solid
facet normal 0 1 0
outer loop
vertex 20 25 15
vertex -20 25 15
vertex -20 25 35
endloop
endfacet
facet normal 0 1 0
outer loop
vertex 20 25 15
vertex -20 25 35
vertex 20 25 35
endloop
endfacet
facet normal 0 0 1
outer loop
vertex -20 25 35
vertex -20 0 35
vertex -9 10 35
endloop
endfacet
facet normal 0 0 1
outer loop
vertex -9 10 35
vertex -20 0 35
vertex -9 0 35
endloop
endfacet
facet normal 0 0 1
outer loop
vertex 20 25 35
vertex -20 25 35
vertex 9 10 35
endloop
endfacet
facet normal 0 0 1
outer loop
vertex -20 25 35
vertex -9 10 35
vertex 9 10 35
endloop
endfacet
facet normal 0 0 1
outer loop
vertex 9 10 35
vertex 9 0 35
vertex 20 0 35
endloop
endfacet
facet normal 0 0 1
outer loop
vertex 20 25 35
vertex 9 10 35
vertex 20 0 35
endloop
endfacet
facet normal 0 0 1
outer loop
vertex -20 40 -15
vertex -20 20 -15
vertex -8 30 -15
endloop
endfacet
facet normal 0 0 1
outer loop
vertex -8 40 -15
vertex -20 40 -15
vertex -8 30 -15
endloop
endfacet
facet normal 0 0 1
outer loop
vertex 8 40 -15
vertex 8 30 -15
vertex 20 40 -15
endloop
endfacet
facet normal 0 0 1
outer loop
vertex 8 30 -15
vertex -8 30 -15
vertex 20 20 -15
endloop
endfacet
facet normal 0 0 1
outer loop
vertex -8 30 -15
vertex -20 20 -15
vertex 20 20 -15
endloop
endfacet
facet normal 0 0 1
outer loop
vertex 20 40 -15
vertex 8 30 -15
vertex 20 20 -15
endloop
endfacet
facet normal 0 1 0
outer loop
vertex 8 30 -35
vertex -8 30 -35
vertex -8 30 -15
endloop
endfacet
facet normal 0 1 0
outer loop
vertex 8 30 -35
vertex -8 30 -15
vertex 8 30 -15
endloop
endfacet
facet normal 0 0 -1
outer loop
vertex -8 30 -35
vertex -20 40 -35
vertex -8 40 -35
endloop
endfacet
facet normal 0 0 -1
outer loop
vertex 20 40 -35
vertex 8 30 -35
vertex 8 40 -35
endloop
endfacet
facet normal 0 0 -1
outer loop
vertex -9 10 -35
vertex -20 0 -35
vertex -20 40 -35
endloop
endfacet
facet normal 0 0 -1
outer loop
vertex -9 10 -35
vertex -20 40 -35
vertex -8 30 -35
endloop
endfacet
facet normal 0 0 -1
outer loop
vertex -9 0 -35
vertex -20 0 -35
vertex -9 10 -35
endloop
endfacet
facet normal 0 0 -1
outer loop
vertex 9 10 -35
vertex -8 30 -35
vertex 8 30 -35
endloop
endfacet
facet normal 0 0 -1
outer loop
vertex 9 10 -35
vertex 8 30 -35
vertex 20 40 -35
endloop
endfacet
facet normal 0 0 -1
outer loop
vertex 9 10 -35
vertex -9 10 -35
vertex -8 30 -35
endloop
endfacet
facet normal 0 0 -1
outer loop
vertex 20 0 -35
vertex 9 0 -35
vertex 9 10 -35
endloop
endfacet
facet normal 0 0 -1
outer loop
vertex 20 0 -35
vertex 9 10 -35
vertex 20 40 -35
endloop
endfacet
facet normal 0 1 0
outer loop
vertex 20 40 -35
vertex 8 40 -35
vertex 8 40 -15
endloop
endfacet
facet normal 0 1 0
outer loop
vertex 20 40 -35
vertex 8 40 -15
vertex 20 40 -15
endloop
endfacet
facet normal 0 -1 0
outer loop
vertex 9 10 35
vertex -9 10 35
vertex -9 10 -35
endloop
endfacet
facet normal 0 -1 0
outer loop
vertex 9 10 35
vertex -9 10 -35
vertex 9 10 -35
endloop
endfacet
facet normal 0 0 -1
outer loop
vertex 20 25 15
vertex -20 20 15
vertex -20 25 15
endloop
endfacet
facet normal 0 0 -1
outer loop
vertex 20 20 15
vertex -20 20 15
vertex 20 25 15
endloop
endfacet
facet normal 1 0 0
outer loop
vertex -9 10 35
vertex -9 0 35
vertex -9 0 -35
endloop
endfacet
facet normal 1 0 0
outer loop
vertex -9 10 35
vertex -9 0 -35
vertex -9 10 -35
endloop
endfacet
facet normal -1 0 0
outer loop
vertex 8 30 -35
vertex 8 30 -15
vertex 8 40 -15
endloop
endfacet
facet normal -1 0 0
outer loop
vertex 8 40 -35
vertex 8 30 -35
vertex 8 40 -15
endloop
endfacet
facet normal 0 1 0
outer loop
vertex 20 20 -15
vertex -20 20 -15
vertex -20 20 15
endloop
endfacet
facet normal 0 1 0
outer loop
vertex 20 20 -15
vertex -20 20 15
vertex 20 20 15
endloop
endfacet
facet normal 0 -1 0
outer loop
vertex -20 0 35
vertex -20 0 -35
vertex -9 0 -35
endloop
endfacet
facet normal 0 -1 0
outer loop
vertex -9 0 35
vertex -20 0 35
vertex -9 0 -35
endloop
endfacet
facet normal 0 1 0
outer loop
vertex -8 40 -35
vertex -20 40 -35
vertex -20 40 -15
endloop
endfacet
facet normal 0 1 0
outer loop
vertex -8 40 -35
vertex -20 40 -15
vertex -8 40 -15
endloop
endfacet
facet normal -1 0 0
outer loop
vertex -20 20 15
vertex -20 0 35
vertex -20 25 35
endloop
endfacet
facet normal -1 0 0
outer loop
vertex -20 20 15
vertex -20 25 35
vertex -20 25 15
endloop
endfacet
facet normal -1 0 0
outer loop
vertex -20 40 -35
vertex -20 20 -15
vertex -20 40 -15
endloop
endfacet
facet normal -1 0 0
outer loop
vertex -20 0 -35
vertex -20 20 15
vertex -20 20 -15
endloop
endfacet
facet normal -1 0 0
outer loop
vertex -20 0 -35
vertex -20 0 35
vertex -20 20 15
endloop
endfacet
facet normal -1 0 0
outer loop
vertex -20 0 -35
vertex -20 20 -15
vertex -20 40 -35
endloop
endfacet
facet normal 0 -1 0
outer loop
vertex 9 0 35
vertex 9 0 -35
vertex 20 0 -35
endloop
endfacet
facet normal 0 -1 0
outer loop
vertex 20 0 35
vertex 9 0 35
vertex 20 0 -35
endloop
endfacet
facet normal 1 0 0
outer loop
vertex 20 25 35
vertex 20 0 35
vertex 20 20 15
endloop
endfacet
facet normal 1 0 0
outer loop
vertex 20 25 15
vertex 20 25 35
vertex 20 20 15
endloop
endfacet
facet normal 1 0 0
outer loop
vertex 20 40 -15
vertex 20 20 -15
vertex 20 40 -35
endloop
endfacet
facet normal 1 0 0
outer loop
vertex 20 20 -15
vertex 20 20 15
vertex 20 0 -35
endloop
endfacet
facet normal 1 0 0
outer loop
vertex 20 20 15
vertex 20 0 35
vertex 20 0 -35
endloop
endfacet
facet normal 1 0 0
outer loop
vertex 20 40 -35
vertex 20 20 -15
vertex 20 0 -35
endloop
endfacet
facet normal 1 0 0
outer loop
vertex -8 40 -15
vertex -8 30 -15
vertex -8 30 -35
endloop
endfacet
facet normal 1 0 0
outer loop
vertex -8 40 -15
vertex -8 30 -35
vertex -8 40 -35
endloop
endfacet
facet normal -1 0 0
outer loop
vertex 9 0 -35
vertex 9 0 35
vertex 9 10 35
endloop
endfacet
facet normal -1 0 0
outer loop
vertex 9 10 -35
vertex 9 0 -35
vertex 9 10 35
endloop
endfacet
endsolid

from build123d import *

# Parameters (mm, degrees)
IZIM1_W                     = 40
IZIM1_H                     = 70
Y_KSEKLIK_EKSTR_ZYON1_DEPTH = 20
IZIM2_W                     = 18
IZIM2_H                     = 10
KES_EKSTR_ZYON1_DEPTH       = 71
IZIM3_W                     = 40
IZIM3_H                     = 20
Y_KSEKLIK_EKSTR_ZYON2_DEPTH = 5
IZIM4_W                     = 40
IZIM4_H                     = 20
Y_KSEKLIK_EKSTR_ZYON3_DEPTH = 20
IZIM5_W                     = 16
IZIM5_H                     = 10
KES_EKSTR_ZYON2_DEPTH       = 21


with BuildPart() as part:
    # Çizim1 → Yükseklik-Ekstrüzyon1 (new body)
    with BuildSketch(Plane(origin=(0, 0, 0), x_dir=(1, 0, 0), z_dir=(0, 1, 0))):
        Rectangle(IZIM1_W, IZIM1_H)
    extrude(amount=Y_KSEKLIK_EKSTR_ZYON1_DEPTH)

    # Çizim2 → Kes-Ekstrüzyon1 (cut, through all)
    with BuildSketch(Plane.XY.offset(35)):
        with Locations((0, 5)):
            Rectangle(IZIM2_W, IZIM2_H)
    extrude(amount=-KES_EKSTR_ZYON1_DEPTH, mode=Mode.SUBTRACT)

    # Çizim3 → Yükseklik-Ekstrüzyon2 (add)
    with BuildSketch(Plane(origin=(0, 20, 0), x_dir=(1, 0, 0), z_dir=(0, 1, 0))):
        with Locations((0, -25)):
            Rectangle(IZIM3_W, IZIM3_H)
    extrude(amount=Y_KSEKLIK_EKSTR_ZYON2_DEPTH)

    # Çizim4 → Yükseklik-Ekstrüzyon3 (add)
    with BuildSketch(Plane(origin=(0, 20, 0), x_dir=(1, 0, 0), z_dir=(0, 1, 0))):
        with Locations((0, 25)):
            Rectangle(IZIM4_W, IZIM4_H)
    extrude(amount=Y_KSEKLIK_EKSTR_ZYON3_DEPTH)

    # Çizim5 → Kes-Ekstrüzyon2 (cut, through all)
    with BuildSketch(Plane.XY.offset(-15)):
        with Locations((0, 35)):
            Rectangle(IZIM5_W, IZIM5_H)
    extrude(amount=-KES_EKSTR_ZYON2_DEPTH, mode=Mode.SUBTRACT)


solid = part.part
